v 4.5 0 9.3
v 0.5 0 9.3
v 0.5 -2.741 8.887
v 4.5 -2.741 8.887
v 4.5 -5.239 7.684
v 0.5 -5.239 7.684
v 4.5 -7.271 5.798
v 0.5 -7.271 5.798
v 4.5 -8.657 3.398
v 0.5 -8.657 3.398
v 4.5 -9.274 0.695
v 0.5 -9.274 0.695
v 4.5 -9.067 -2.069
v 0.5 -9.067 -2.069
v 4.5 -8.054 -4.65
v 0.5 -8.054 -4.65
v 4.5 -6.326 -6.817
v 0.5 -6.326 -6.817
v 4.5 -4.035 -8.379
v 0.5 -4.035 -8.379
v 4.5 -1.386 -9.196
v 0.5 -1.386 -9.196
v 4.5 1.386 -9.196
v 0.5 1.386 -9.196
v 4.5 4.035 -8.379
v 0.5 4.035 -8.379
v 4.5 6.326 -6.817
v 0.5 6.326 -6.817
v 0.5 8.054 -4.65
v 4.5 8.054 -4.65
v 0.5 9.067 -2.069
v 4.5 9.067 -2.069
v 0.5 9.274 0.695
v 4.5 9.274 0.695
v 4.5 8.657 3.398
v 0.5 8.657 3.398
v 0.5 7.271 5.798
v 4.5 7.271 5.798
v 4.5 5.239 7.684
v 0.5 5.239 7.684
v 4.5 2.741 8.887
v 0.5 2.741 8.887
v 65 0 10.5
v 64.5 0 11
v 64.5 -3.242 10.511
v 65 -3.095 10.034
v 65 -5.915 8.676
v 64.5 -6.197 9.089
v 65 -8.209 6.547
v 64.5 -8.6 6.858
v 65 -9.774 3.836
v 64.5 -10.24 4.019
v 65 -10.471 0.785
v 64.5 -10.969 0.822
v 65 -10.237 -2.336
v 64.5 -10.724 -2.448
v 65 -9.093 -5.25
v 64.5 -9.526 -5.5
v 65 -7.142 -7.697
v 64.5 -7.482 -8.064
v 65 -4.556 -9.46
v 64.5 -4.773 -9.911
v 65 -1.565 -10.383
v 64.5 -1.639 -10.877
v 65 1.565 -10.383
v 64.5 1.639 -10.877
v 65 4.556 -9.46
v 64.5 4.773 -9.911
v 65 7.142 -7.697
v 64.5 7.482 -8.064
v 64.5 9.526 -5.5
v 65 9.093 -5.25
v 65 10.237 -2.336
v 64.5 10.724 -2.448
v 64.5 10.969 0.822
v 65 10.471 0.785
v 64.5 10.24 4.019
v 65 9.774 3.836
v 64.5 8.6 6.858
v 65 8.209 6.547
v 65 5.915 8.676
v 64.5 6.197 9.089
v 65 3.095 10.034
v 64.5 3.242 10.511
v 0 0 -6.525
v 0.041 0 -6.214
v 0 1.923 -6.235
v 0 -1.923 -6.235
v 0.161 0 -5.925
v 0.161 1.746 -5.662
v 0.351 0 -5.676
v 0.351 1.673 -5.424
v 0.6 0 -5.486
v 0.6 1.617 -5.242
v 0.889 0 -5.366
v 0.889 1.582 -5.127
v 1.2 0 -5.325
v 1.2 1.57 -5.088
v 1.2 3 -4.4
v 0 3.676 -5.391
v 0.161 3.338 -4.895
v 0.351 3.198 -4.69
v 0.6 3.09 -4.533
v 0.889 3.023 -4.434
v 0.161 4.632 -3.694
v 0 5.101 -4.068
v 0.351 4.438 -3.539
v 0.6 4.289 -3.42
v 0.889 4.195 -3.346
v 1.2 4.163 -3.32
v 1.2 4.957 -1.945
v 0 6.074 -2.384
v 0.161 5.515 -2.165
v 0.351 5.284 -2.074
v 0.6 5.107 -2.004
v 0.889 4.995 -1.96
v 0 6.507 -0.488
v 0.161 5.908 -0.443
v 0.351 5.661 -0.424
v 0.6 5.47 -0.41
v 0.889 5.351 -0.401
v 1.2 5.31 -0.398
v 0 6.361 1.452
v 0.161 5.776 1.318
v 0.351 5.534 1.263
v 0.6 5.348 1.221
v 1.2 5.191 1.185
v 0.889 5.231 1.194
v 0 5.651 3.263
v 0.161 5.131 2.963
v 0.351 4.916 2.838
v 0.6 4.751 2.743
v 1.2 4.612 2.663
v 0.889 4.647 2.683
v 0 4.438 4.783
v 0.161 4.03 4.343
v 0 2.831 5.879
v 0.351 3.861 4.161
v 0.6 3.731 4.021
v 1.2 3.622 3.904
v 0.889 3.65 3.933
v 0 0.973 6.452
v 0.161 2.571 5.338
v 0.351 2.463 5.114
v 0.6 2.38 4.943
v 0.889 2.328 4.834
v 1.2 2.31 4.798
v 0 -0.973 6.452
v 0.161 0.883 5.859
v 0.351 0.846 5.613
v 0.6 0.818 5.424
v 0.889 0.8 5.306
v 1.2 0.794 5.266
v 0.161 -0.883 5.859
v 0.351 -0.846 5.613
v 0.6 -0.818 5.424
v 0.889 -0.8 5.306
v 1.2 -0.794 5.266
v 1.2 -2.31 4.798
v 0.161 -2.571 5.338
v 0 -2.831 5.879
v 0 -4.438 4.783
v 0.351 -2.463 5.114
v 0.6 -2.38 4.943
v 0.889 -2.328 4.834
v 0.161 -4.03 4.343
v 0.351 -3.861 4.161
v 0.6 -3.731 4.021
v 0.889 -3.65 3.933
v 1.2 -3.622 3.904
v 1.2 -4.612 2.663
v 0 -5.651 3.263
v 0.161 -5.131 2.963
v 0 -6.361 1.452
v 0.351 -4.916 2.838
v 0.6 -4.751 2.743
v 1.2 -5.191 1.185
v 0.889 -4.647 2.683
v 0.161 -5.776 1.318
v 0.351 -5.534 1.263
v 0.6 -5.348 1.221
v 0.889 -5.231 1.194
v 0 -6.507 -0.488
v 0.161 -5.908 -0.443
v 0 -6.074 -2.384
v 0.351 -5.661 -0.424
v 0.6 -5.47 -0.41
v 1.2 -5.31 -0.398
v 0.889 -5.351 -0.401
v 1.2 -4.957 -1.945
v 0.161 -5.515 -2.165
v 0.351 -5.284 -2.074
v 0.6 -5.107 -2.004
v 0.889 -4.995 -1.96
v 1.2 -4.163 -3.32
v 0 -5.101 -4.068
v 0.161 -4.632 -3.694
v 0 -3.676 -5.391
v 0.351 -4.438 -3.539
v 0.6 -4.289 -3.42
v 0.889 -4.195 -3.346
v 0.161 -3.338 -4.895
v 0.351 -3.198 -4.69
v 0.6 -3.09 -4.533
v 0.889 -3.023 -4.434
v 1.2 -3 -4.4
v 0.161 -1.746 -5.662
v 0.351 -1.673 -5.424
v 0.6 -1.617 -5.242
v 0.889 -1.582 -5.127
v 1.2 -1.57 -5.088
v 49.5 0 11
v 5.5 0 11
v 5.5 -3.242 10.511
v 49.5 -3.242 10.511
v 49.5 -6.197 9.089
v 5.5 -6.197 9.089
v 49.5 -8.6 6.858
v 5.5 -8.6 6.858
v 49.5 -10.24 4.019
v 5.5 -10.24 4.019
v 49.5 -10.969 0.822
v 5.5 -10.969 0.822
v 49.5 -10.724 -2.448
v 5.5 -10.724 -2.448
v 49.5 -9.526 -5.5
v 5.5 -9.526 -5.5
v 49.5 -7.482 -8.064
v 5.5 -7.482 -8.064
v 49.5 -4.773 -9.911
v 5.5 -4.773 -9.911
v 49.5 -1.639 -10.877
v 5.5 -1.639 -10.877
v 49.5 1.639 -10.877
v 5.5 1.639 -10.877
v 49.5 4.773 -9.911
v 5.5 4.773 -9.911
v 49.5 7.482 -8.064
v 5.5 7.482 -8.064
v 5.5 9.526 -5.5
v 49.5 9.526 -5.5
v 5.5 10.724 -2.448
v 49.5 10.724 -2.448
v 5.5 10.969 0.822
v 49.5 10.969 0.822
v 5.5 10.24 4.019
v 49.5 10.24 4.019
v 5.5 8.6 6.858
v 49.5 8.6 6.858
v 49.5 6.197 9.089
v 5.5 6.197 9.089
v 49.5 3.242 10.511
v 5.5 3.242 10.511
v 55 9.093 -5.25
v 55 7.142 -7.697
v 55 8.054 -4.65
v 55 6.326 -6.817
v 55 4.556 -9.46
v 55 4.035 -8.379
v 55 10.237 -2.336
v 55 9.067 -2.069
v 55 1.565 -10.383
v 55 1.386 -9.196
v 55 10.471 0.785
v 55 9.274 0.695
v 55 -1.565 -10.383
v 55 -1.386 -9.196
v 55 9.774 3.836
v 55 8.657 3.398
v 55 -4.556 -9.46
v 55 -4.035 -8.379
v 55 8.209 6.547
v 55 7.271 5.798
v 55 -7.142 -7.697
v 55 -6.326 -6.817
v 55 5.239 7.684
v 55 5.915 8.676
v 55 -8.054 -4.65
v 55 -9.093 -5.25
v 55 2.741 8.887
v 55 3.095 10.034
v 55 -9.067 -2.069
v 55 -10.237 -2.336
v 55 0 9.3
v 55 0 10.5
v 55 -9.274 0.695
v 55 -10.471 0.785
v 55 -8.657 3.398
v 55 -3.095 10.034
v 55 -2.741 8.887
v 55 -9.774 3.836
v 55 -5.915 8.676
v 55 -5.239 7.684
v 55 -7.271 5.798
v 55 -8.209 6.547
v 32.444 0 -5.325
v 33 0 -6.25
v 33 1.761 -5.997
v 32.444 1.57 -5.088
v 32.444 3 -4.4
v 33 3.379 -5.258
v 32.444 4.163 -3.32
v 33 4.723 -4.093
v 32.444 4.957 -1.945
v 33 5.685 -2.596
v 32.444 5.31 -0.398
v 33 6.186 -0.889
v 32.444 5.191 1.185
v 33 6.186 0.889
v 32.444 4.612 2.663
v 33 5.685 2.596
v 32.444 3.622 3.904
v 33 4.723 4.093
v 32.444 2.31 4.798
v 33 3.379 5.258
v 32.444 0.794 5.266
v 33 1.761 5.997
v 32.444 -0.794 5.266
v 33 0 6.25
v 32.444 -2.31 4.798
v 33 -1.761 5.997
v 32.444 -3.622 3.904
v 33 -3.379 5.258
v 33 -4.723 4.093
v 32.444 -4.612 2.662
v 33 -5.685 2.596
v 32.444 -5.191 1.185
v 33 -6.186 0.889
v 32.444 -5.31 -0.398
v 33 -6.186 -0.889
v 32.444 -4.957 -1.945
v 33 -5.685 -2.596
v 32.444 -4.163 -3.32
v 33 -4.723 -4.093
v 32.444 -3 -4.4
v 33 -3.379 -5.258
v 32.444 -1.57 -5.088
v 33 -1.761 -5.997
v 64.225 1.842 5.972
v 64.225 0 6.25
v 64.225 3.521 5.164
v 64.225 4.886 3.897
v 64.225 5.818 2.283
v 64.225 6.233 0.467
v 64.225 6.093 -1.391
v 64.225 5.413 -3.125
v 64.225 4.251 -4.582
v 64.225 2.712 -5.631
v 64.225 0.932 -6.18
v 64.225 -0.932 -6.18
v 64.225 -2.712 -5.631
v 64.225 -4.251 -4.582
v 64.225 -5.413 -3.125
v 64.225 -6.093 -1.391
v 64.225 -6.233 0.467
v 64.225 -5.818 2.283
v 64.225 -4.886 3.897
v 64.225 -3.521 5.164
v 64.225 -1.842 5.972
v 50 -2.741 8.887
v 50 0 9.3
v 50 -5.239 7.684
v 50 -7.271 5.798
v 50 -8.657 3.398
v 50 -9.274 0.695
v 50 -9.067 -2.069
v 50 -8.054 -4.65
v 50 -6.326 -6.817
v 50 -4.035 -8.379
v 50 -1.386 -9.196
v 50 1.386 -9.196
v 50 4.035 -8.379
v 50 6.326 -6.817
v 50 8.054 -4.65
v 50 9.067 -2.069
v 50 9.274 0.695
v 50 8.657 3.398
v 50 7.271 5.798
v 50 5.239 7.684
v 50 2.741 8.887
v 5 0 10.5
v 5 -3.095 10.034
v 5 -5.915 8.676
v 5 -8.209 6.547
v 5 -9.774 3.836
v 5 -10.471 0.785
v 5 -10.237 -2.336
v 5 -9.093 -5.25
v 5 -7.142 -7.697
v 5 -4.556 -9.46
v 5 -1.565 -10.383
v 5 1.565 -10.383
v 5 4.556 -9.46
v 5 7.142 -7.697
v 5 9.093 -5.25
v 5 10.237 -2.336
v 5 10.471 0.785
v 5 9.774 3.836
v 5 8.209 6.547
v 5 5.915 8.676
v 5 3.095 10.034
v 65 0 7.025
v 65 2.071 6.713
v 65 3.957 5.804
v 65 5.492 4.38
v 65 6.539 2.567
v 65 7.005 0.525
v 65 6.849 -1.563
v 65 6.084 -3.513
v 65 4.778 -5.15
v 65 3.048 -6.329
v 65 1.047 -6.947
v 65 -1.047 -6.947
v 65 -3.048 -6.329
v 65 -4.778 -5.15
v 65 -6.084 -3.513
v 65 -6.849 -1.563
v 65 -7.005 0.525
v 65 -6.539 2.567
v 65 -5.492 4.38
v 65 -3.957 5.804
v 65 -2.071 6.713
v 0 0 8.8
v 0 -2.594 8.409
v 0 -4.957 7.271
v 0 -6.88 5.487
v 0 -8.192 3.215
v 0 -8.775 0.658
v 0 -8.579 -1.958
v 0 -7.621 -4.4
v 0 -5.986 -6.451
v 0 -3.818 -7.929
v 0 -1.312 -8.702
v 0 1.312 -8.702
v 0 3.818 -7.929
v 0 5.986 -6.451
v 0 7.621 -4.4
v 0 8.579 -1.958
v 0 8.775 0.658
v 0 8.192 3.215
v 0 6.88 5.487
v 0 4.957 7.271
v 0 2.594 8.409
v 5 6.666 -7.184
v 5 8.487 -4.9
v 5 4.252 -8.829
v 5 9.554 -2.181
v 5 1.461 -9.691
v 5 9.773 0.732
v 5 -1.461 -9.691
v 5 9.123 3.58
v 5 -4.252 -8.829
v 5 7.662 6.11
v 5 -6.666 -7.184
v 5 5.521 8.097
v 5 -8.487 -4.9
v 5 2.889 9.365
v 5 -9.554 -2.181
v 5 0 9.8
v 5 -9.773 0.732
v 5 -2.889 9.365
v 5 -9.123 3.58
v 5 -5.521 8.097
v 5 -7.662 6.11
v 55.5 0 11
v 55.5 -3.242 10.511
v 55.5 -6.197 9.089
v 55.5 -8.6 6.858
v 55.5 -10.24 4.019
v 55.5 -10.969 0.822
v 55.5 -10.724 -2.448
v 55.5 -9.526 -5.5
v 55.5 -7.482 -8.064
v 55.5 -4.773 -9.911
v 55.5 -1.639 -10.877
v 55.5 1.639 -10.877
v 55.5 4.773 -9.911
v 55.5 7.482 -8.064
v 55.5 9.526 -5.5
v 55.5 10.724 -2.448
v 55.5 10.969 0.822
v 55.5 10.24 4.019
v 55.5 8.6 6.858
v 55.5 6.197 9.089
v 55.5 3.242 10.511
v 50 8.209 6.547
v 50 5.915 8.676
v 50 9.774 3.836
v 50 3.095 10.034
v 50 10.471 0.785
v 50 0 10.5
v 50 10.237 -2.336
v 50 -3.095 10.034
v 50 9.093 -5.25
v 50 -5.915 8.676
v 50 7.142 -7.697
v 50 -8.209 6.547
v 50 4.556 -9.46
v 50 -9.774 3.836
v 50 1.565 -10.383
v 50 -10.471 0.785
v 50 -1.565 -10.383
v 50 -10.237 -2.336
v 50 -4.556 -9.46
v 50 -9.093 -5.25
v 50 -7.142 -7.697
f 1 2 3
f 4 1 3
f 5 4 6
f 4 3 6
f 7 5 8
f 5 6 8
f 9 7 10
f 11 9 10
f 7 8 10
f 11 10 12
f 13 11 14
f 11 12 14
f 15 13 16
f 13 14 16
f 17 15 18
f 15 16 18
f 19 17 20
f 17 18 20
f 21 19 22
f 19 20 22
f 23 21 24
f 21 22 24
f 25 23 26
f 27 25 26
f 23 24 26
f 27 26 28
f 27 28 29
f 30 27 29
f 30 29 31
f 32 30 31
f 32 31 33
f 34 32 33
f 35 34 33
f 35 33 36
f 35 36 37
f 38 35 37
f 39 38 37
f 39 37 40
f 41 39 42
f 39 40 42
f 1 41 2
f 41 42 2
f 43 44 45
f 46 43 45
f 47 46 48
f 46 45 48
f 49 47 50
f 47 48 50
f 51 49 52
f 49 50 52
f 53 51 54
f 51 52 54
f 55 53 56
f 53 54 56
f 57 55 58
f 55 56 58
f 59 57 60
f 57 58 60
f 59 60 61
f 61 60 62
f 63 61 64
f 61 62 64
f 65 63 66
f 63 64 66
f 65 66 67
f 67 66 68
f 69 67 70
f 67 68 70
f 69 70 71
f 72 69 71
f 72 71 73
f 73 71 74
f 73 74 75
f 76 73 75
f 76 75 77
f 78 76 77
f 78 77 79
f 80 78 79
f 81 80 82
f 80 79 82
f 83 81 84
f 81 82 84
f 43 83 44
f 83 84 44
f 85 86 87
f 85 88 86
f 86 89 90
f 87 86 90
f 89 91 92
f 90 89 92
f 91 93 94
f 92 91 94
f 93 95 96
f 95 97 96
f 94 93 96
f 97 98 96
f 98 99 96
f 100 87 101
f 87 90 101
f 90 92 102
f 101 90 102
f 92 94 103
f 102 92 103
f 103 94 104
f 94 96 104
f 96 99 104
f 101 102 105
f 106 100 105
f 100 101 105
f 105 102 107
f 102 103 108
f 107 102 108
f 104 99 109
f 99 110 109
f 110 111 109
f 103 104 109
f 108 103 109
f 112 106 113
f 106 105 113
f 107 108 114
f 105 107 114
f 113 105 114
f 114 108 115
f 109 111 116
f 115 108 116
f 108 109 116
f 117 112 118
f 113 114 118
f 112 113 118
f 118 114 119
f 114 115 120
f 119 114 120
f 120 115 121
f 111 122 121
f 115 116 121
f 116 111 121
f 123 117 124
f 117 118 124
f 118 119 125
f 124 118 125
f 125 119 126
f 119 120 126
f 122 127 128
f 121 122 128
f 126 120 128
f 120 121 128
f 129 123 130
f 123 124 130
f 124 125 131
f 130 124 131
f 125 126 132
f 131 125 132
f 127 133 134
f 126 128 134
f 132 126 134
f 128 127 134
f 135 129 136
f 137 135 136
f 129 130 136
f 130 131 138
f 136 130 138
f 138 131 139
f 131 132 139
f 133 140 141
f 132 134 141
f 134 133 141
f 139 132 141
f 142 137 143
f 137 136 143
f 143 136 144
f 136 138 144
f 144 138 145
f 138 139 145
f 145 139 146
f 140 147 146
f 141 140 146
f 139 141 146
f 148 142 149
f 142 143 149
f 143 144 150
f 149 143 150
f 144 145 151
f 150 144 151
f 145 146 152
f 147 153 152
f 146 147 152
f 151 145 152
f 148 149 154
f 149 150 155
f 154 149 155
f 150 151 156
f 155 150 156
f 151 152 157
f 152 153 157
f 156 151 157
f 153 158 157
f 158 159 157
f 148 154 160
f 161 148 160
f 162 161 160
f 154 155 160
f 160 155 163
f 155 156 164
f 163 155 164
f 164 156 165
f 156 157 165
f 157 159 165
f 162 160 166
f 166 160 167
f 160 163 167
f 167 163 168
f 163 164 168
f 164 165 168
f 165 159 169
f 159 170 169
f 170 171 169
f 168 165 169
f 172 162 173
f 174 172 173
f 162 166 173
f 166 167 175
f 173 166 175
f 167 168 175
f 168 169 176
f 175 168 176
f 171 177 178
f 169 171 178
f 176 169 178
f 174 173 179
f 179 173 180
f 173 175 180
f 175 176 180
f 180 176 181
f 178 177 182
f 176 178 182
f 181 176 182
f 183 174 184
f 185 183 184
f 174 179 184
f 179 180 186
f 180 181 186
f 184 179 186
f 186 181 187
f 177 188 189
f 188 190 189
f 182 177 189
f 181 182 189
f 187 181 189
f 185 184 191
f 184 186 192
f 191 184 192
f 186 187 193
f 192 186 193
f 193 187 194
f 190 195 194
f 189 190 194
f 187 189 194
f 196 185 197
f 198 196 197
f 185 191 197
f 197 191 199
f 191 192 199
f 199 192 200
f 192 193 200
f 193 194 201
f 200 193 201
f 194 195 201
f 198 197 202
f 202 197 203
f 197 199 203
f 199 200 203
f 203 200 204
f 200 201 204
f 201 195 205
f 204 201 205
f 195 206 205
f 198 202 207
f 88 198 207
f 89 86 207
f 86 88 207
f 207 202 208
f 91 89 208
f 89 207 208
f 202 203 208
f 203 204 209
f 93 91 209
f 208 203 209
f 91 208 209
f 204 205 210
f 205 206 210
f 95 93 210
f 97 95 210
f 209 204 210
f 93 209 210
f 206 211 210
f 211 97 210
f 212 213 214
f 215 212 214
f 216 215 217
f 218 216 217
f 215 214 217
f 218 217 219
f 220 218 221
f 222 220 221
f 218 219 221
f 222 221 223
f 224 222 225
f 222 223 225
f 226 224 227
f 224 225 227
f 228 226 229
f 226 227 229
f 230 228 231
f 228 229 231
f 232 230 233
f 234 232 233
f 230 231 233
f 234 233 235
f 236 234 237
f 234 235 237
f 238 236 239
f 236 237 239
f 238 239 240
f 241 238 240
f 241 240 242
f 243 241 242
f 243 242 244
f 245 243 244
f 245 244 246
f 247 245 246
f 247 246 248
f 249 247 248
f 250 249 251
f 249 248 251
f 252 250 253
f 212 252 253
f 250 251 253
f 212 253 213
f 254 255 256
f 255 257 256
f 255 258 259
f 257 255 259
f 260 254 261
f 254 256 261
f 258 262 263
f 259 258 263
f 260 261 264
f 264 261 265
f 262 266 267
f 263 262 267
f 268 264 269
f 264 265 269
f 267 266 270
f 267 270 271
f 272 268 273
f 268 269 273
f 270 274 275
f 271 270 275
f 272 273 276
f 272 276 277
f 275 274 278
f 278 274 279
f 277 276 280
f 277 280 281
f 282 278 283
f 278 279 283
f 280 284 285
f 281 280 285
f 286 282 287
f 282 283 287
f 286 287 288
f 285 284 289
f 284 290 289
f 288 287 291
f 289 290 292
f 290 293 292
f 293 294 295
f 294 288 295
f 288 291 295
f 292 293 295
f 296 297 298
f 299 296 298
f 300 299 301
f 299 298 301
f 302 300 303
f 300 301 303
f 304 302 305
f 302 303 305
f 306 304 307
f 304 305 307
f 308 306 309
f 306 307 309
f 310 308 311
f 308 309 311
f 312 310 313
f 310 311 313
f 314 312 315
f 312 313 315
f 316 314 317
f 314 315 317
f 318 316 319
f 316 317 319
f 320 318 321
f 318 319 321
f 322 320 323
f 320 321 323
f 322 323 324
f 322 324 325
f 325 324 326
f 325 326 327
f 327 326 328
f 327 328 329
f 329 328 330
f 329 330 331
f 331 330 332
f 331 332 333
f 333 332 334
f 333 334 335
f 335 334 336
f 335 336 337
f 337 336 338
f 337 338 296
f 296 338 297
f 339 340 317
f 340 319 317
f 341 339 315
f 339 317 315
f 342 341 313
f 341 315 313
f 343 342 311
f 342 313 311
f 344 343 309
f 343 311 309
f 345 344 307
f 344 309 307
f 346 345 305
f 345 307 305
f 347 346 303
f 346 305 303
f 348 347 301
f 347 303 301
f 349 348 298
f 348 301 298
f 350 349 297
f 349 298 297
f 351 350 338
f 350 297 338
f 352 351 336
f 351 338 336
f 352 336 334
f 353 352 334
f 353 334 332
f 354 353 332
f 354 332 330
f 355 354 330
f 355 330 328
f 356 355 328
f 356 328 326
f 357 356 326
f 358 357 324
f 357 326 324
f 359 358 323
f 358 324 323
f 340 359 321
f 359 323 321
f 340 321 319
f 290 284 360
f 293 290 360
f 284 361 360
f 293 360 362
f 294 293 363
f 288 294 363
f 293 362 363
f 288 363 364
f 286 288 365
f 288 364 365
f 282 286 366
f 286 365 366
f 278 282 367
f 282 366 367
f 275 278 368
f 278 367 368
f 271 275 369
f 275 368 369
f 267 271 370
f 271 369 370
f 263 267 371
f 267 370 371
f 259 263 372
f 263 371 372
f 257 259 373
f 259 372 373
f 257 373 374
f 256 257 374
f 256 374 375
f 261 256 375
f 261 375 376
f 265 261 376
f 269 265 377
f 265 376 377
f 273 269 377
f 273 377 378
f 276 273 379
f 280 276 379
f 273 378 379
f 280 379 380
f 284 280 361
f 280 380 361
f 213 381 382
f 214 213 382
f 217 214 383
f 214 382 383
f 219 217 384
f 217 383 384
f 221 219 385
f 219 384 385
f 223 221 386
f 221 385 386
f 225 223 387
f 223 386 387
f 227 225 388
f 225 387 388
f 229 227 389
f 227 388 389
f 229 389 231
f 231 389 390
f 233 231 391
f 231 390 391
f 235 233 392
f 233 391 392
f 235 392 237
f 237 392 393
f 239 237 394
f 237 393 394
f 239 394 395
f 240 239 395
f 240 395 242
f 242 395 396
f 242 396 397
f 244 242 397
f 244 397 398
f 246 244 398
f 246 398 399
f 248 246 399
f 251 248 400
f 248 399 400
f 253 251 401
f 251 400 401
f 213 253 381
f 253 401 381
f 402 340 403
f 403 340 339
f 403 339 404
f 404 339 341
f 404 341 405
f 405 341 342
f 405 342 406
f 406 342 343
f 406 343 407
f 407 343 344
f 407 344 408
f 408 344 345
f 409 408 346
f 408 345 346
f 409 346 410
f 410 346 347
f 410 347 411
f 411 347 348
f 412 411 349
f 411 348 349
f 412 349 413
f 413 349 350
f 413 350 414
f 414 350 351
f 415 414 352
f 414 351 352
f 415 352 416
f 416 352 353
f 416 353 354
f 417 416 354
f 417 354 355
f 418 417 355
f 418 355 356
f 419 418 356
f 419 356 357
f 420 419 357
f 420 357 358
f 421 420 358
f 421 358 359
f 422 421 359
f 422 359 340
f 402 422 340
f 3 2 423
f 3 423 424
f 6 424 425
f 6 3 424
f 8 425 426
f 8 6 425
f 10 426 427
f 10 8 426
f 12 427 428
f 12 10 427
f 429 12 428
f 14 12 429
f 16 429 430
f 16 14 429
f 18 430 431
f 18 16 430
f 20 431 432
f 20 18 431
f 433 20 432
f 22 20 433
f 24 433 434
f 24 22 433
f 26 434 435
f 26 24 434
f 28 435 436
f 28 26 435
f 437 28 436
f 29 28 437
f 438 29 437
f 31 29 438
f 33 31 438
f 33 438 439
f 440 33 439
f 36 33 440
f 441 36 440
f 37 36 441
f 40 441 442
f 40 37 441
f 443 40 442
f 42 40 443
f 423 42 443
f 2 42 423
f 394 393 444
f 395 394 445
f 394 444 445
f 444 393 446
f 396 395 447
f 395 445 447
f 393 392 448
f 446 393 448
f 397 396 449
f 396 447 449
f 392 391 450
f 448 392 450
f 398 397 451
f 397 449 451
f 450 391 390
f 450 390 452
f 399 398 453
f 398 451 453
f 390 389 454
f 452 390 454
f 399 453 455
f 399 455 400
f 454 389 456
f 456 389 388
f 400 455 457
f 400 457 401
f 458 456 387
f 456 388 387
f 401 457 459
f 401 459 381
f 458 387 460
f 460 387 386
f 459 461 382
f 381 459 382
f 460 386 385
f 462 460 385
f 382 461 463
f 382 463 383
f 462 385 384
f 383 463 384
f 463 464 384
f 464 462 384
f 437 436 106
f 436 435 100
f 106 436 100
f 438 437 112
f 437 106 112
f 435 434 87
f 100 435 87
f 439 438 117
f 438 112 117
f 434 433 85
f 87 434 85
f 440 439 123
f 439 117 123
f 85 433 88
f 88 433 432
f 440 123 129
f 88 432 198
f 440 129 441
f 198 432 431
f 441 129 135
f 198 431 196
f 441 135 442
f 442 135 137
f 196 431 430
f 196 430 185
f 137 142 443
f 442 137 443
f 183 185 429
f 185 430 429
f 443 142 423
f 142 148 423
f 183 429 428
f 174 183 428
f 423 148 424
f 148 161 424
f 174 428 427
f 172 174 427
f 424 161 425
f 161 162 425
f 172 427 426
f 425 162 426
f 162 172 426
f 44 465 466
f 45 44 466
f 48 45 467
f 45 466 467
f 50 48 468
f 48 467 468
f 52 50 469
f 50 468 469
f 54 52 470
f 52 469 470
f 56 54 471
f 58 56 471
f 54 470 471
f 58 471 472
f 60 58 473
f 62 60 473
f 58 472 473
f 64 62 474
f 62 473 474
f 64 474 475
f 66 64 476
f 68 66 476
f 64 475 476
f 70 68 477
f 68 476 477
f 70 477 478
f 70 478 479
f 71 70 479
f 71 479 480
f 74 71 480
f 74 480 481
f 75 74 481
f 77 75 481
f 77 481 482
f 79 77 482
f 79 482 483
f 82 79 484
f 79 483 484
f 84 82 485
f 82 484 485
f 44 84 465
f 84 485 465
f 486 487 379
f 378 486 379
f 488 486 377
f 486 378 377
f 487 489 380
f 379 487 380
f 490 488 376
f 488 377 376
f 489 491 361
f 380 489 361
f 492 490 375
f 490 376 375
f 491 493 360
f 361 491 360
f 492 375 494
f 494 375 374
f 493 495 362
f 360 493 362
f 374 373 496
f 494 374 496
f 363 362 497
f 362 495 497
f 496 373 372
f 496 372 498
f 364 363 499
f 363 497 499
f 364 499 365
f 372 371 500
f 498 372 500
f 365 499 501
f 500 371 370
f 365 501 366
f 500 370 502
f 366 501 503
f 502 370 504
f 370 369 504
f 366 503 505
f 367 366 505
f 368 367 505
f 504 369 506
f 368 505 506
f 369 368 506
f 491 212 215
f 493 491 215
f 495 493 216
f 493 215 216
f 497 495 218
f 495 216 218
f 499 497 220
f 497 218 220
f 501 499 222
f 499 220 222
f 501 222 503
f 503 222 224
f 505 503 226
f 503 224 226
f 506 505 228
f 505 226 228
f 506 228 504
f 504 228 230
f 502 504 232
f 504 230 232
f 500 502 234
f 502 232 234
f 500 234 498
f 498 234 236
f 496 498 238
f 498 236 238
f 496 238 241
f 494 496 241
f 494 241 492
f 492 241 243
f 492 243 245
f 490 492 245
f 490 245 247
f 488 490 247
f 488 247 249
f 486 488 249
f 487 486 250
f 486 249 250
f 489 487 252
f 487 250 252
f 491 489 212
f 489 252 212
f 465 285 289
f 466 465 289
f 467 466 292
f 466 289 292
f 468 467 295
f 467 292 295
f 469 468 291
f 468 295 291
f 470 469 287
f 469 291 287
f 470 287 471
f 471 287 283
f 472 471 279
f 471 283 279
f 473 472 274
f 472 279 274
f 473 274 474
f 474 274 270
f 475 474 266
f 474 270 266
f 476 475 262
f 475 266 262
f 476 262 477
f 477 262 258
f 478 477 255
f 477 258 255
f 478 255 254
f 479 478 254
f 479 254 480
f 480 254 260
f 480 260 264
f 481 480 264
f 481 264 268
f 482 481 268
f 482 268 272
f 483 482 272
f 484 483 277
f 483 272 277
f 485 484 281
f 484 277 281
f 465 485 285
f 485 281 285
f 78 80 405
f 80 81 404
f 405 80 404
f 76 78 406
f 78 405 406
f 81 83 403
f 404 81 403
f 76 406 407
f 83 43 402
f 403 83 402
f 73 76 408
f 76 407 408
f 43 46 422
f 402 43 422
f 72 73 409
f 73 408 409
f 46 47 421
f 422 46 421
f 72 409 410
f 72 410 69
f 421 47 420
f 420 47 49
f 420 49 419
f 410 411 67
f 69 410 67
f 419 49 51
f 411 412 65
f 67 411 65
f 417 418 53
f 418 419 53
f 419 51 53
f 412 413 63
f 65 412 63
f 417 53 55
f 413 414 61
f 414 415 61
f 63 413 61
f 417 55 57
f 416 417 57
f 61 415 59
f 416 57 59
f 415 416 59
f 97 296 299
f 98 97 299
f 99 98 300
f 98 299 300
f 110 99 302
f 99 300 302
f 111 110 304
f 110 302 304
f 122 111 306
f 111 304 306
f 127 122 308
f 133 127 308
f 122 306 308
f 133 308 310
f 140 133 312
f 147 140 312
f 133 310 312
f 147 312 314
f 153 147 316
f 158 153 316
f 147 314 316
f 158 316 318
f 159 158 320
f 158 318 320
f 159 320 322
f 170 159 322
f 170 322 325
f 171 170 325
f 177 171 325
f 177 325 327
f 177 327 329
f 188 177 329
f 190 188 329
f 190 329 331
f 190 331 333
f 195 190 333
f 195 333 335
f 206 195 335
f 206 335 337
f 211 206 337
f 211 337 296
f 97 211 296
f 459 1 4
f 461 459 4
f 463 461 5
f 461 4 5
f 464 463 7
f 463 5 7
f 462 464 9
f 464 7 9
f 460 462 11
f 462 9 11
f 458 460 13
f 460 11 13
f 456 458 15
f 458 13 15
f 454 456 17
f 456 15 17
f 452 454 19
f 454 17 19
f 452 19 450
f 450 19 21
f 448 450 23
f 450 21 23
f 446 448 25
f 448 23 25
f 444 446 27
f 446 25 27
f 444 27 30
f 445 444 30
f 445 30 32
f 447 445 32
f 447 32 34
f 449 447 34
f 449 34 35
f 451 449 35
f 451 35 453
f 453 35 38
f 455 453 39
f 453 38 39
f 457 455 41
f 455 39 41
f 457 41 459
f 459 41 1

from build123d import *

# Parameters (mm, degrees)
FURO_ROSCADO_DE_M14X1_51_D           = 12.5
FURO_ROSCADO_DE_M14X1_51_DEPTH       = 32
FURO_ROSCADO_DE_M14X1_51_CSINK_D     = 14.05
FURO_ROSCADO_DE_M14X1_51_CSINK_ANGLE = 90
FURO_ROSCADO_DE_M14X1_51_TIP         = 3.755378869
FURO1_D                              = 10.65
FURO1_DEPTH                          = 33
CHANFRO1_SIZE                        = 0.5
FILETE1_R                            = 1.2
CHANFRO2_SIZE                        = 0.5


with BuildPart() as part:
    # Esboço1 → Revolução1 (revolve)
    with BuildSketch(Plane.XY, mode=Mode.PRIVATE) as revolu_o1_sk:
        Polygon((0, 0), (65, 0), (65, 11), (55, 11), (55, 9.3), (50, 9.3), (50, 11), (5, 11), (5, 9.3), (0, 9.3), align=None)
    revolve(revolu_o1_sk.sketch.rotate(Axis((0, 0, 0), (1, 0, 0)), 90), axis=Axis((0, 0, 0), (1, 0, 0)))

    # Furo roscado de M14x1.51
    with Locations(Plane(origin=(65, 0, 0), x_dir=(0, 0, -1), z_dir=(1, 0, 0))):
        with Locations((0, 0)):
            CounterSinkHole(FURO_ROSCADO_DE_M14X1_51_D / 2, FURO_ROSCADO_DE_M14X1_51_CSINK_D / 2, depth=FURO_ROSCADO_DE_M14X1_51_DEPTH, counter_sink_angle=FURO_ROSCADO_DE_M14X1_51_CSINK_ANGLE)
            with Locations((0, 0, -(FURO_ROSCADO_DE_M14X1_51_DEPTH + FURO_ROSCADO_DE_M14X1_51_TIP / 2))):  # 118° drill point
                Cone(0, FURO_ROSCADO_DE_M14X1_51_D / 2, FURO_ROSCADO_DE_M14X1_51_TIP, mode=Mode.SUBTRACT)

    # Furo1
    with Locations(Plane.ZY):
        with Locations((0, 0)):
            Hole(FURO1_D / 2, depth=FURO1_DEPTH)

    # Chanfro1
    chanfro1_edges = [part.edges().sort_by_distance(p)[0] for p in [
        (5, 0, -9.3),
        (5, 0, -11),
        (50, 0, -11),
    ]]
    chamfer(chanfro1_edges, length=CHANFRO1_SIZE)

    # Filete1
    filete1_edges = [part.edges().sort_by_distance(p)[0] for p in [
        (0, 0, 5.325),
    ]]
    fillet(filete1_edges, radius=FILETE1_R)

    # Chanfro2
    chanfro2_edges = [part.edges().sort_by_distance(p)[0] for p in [
        (65, 0, -11),
        (0, 0, -9.3),
        (55, 0, -11),
    ]]
    chamfer(chanfro2_edges, length=CHANFRO2_SIZE)


solid = part.part
